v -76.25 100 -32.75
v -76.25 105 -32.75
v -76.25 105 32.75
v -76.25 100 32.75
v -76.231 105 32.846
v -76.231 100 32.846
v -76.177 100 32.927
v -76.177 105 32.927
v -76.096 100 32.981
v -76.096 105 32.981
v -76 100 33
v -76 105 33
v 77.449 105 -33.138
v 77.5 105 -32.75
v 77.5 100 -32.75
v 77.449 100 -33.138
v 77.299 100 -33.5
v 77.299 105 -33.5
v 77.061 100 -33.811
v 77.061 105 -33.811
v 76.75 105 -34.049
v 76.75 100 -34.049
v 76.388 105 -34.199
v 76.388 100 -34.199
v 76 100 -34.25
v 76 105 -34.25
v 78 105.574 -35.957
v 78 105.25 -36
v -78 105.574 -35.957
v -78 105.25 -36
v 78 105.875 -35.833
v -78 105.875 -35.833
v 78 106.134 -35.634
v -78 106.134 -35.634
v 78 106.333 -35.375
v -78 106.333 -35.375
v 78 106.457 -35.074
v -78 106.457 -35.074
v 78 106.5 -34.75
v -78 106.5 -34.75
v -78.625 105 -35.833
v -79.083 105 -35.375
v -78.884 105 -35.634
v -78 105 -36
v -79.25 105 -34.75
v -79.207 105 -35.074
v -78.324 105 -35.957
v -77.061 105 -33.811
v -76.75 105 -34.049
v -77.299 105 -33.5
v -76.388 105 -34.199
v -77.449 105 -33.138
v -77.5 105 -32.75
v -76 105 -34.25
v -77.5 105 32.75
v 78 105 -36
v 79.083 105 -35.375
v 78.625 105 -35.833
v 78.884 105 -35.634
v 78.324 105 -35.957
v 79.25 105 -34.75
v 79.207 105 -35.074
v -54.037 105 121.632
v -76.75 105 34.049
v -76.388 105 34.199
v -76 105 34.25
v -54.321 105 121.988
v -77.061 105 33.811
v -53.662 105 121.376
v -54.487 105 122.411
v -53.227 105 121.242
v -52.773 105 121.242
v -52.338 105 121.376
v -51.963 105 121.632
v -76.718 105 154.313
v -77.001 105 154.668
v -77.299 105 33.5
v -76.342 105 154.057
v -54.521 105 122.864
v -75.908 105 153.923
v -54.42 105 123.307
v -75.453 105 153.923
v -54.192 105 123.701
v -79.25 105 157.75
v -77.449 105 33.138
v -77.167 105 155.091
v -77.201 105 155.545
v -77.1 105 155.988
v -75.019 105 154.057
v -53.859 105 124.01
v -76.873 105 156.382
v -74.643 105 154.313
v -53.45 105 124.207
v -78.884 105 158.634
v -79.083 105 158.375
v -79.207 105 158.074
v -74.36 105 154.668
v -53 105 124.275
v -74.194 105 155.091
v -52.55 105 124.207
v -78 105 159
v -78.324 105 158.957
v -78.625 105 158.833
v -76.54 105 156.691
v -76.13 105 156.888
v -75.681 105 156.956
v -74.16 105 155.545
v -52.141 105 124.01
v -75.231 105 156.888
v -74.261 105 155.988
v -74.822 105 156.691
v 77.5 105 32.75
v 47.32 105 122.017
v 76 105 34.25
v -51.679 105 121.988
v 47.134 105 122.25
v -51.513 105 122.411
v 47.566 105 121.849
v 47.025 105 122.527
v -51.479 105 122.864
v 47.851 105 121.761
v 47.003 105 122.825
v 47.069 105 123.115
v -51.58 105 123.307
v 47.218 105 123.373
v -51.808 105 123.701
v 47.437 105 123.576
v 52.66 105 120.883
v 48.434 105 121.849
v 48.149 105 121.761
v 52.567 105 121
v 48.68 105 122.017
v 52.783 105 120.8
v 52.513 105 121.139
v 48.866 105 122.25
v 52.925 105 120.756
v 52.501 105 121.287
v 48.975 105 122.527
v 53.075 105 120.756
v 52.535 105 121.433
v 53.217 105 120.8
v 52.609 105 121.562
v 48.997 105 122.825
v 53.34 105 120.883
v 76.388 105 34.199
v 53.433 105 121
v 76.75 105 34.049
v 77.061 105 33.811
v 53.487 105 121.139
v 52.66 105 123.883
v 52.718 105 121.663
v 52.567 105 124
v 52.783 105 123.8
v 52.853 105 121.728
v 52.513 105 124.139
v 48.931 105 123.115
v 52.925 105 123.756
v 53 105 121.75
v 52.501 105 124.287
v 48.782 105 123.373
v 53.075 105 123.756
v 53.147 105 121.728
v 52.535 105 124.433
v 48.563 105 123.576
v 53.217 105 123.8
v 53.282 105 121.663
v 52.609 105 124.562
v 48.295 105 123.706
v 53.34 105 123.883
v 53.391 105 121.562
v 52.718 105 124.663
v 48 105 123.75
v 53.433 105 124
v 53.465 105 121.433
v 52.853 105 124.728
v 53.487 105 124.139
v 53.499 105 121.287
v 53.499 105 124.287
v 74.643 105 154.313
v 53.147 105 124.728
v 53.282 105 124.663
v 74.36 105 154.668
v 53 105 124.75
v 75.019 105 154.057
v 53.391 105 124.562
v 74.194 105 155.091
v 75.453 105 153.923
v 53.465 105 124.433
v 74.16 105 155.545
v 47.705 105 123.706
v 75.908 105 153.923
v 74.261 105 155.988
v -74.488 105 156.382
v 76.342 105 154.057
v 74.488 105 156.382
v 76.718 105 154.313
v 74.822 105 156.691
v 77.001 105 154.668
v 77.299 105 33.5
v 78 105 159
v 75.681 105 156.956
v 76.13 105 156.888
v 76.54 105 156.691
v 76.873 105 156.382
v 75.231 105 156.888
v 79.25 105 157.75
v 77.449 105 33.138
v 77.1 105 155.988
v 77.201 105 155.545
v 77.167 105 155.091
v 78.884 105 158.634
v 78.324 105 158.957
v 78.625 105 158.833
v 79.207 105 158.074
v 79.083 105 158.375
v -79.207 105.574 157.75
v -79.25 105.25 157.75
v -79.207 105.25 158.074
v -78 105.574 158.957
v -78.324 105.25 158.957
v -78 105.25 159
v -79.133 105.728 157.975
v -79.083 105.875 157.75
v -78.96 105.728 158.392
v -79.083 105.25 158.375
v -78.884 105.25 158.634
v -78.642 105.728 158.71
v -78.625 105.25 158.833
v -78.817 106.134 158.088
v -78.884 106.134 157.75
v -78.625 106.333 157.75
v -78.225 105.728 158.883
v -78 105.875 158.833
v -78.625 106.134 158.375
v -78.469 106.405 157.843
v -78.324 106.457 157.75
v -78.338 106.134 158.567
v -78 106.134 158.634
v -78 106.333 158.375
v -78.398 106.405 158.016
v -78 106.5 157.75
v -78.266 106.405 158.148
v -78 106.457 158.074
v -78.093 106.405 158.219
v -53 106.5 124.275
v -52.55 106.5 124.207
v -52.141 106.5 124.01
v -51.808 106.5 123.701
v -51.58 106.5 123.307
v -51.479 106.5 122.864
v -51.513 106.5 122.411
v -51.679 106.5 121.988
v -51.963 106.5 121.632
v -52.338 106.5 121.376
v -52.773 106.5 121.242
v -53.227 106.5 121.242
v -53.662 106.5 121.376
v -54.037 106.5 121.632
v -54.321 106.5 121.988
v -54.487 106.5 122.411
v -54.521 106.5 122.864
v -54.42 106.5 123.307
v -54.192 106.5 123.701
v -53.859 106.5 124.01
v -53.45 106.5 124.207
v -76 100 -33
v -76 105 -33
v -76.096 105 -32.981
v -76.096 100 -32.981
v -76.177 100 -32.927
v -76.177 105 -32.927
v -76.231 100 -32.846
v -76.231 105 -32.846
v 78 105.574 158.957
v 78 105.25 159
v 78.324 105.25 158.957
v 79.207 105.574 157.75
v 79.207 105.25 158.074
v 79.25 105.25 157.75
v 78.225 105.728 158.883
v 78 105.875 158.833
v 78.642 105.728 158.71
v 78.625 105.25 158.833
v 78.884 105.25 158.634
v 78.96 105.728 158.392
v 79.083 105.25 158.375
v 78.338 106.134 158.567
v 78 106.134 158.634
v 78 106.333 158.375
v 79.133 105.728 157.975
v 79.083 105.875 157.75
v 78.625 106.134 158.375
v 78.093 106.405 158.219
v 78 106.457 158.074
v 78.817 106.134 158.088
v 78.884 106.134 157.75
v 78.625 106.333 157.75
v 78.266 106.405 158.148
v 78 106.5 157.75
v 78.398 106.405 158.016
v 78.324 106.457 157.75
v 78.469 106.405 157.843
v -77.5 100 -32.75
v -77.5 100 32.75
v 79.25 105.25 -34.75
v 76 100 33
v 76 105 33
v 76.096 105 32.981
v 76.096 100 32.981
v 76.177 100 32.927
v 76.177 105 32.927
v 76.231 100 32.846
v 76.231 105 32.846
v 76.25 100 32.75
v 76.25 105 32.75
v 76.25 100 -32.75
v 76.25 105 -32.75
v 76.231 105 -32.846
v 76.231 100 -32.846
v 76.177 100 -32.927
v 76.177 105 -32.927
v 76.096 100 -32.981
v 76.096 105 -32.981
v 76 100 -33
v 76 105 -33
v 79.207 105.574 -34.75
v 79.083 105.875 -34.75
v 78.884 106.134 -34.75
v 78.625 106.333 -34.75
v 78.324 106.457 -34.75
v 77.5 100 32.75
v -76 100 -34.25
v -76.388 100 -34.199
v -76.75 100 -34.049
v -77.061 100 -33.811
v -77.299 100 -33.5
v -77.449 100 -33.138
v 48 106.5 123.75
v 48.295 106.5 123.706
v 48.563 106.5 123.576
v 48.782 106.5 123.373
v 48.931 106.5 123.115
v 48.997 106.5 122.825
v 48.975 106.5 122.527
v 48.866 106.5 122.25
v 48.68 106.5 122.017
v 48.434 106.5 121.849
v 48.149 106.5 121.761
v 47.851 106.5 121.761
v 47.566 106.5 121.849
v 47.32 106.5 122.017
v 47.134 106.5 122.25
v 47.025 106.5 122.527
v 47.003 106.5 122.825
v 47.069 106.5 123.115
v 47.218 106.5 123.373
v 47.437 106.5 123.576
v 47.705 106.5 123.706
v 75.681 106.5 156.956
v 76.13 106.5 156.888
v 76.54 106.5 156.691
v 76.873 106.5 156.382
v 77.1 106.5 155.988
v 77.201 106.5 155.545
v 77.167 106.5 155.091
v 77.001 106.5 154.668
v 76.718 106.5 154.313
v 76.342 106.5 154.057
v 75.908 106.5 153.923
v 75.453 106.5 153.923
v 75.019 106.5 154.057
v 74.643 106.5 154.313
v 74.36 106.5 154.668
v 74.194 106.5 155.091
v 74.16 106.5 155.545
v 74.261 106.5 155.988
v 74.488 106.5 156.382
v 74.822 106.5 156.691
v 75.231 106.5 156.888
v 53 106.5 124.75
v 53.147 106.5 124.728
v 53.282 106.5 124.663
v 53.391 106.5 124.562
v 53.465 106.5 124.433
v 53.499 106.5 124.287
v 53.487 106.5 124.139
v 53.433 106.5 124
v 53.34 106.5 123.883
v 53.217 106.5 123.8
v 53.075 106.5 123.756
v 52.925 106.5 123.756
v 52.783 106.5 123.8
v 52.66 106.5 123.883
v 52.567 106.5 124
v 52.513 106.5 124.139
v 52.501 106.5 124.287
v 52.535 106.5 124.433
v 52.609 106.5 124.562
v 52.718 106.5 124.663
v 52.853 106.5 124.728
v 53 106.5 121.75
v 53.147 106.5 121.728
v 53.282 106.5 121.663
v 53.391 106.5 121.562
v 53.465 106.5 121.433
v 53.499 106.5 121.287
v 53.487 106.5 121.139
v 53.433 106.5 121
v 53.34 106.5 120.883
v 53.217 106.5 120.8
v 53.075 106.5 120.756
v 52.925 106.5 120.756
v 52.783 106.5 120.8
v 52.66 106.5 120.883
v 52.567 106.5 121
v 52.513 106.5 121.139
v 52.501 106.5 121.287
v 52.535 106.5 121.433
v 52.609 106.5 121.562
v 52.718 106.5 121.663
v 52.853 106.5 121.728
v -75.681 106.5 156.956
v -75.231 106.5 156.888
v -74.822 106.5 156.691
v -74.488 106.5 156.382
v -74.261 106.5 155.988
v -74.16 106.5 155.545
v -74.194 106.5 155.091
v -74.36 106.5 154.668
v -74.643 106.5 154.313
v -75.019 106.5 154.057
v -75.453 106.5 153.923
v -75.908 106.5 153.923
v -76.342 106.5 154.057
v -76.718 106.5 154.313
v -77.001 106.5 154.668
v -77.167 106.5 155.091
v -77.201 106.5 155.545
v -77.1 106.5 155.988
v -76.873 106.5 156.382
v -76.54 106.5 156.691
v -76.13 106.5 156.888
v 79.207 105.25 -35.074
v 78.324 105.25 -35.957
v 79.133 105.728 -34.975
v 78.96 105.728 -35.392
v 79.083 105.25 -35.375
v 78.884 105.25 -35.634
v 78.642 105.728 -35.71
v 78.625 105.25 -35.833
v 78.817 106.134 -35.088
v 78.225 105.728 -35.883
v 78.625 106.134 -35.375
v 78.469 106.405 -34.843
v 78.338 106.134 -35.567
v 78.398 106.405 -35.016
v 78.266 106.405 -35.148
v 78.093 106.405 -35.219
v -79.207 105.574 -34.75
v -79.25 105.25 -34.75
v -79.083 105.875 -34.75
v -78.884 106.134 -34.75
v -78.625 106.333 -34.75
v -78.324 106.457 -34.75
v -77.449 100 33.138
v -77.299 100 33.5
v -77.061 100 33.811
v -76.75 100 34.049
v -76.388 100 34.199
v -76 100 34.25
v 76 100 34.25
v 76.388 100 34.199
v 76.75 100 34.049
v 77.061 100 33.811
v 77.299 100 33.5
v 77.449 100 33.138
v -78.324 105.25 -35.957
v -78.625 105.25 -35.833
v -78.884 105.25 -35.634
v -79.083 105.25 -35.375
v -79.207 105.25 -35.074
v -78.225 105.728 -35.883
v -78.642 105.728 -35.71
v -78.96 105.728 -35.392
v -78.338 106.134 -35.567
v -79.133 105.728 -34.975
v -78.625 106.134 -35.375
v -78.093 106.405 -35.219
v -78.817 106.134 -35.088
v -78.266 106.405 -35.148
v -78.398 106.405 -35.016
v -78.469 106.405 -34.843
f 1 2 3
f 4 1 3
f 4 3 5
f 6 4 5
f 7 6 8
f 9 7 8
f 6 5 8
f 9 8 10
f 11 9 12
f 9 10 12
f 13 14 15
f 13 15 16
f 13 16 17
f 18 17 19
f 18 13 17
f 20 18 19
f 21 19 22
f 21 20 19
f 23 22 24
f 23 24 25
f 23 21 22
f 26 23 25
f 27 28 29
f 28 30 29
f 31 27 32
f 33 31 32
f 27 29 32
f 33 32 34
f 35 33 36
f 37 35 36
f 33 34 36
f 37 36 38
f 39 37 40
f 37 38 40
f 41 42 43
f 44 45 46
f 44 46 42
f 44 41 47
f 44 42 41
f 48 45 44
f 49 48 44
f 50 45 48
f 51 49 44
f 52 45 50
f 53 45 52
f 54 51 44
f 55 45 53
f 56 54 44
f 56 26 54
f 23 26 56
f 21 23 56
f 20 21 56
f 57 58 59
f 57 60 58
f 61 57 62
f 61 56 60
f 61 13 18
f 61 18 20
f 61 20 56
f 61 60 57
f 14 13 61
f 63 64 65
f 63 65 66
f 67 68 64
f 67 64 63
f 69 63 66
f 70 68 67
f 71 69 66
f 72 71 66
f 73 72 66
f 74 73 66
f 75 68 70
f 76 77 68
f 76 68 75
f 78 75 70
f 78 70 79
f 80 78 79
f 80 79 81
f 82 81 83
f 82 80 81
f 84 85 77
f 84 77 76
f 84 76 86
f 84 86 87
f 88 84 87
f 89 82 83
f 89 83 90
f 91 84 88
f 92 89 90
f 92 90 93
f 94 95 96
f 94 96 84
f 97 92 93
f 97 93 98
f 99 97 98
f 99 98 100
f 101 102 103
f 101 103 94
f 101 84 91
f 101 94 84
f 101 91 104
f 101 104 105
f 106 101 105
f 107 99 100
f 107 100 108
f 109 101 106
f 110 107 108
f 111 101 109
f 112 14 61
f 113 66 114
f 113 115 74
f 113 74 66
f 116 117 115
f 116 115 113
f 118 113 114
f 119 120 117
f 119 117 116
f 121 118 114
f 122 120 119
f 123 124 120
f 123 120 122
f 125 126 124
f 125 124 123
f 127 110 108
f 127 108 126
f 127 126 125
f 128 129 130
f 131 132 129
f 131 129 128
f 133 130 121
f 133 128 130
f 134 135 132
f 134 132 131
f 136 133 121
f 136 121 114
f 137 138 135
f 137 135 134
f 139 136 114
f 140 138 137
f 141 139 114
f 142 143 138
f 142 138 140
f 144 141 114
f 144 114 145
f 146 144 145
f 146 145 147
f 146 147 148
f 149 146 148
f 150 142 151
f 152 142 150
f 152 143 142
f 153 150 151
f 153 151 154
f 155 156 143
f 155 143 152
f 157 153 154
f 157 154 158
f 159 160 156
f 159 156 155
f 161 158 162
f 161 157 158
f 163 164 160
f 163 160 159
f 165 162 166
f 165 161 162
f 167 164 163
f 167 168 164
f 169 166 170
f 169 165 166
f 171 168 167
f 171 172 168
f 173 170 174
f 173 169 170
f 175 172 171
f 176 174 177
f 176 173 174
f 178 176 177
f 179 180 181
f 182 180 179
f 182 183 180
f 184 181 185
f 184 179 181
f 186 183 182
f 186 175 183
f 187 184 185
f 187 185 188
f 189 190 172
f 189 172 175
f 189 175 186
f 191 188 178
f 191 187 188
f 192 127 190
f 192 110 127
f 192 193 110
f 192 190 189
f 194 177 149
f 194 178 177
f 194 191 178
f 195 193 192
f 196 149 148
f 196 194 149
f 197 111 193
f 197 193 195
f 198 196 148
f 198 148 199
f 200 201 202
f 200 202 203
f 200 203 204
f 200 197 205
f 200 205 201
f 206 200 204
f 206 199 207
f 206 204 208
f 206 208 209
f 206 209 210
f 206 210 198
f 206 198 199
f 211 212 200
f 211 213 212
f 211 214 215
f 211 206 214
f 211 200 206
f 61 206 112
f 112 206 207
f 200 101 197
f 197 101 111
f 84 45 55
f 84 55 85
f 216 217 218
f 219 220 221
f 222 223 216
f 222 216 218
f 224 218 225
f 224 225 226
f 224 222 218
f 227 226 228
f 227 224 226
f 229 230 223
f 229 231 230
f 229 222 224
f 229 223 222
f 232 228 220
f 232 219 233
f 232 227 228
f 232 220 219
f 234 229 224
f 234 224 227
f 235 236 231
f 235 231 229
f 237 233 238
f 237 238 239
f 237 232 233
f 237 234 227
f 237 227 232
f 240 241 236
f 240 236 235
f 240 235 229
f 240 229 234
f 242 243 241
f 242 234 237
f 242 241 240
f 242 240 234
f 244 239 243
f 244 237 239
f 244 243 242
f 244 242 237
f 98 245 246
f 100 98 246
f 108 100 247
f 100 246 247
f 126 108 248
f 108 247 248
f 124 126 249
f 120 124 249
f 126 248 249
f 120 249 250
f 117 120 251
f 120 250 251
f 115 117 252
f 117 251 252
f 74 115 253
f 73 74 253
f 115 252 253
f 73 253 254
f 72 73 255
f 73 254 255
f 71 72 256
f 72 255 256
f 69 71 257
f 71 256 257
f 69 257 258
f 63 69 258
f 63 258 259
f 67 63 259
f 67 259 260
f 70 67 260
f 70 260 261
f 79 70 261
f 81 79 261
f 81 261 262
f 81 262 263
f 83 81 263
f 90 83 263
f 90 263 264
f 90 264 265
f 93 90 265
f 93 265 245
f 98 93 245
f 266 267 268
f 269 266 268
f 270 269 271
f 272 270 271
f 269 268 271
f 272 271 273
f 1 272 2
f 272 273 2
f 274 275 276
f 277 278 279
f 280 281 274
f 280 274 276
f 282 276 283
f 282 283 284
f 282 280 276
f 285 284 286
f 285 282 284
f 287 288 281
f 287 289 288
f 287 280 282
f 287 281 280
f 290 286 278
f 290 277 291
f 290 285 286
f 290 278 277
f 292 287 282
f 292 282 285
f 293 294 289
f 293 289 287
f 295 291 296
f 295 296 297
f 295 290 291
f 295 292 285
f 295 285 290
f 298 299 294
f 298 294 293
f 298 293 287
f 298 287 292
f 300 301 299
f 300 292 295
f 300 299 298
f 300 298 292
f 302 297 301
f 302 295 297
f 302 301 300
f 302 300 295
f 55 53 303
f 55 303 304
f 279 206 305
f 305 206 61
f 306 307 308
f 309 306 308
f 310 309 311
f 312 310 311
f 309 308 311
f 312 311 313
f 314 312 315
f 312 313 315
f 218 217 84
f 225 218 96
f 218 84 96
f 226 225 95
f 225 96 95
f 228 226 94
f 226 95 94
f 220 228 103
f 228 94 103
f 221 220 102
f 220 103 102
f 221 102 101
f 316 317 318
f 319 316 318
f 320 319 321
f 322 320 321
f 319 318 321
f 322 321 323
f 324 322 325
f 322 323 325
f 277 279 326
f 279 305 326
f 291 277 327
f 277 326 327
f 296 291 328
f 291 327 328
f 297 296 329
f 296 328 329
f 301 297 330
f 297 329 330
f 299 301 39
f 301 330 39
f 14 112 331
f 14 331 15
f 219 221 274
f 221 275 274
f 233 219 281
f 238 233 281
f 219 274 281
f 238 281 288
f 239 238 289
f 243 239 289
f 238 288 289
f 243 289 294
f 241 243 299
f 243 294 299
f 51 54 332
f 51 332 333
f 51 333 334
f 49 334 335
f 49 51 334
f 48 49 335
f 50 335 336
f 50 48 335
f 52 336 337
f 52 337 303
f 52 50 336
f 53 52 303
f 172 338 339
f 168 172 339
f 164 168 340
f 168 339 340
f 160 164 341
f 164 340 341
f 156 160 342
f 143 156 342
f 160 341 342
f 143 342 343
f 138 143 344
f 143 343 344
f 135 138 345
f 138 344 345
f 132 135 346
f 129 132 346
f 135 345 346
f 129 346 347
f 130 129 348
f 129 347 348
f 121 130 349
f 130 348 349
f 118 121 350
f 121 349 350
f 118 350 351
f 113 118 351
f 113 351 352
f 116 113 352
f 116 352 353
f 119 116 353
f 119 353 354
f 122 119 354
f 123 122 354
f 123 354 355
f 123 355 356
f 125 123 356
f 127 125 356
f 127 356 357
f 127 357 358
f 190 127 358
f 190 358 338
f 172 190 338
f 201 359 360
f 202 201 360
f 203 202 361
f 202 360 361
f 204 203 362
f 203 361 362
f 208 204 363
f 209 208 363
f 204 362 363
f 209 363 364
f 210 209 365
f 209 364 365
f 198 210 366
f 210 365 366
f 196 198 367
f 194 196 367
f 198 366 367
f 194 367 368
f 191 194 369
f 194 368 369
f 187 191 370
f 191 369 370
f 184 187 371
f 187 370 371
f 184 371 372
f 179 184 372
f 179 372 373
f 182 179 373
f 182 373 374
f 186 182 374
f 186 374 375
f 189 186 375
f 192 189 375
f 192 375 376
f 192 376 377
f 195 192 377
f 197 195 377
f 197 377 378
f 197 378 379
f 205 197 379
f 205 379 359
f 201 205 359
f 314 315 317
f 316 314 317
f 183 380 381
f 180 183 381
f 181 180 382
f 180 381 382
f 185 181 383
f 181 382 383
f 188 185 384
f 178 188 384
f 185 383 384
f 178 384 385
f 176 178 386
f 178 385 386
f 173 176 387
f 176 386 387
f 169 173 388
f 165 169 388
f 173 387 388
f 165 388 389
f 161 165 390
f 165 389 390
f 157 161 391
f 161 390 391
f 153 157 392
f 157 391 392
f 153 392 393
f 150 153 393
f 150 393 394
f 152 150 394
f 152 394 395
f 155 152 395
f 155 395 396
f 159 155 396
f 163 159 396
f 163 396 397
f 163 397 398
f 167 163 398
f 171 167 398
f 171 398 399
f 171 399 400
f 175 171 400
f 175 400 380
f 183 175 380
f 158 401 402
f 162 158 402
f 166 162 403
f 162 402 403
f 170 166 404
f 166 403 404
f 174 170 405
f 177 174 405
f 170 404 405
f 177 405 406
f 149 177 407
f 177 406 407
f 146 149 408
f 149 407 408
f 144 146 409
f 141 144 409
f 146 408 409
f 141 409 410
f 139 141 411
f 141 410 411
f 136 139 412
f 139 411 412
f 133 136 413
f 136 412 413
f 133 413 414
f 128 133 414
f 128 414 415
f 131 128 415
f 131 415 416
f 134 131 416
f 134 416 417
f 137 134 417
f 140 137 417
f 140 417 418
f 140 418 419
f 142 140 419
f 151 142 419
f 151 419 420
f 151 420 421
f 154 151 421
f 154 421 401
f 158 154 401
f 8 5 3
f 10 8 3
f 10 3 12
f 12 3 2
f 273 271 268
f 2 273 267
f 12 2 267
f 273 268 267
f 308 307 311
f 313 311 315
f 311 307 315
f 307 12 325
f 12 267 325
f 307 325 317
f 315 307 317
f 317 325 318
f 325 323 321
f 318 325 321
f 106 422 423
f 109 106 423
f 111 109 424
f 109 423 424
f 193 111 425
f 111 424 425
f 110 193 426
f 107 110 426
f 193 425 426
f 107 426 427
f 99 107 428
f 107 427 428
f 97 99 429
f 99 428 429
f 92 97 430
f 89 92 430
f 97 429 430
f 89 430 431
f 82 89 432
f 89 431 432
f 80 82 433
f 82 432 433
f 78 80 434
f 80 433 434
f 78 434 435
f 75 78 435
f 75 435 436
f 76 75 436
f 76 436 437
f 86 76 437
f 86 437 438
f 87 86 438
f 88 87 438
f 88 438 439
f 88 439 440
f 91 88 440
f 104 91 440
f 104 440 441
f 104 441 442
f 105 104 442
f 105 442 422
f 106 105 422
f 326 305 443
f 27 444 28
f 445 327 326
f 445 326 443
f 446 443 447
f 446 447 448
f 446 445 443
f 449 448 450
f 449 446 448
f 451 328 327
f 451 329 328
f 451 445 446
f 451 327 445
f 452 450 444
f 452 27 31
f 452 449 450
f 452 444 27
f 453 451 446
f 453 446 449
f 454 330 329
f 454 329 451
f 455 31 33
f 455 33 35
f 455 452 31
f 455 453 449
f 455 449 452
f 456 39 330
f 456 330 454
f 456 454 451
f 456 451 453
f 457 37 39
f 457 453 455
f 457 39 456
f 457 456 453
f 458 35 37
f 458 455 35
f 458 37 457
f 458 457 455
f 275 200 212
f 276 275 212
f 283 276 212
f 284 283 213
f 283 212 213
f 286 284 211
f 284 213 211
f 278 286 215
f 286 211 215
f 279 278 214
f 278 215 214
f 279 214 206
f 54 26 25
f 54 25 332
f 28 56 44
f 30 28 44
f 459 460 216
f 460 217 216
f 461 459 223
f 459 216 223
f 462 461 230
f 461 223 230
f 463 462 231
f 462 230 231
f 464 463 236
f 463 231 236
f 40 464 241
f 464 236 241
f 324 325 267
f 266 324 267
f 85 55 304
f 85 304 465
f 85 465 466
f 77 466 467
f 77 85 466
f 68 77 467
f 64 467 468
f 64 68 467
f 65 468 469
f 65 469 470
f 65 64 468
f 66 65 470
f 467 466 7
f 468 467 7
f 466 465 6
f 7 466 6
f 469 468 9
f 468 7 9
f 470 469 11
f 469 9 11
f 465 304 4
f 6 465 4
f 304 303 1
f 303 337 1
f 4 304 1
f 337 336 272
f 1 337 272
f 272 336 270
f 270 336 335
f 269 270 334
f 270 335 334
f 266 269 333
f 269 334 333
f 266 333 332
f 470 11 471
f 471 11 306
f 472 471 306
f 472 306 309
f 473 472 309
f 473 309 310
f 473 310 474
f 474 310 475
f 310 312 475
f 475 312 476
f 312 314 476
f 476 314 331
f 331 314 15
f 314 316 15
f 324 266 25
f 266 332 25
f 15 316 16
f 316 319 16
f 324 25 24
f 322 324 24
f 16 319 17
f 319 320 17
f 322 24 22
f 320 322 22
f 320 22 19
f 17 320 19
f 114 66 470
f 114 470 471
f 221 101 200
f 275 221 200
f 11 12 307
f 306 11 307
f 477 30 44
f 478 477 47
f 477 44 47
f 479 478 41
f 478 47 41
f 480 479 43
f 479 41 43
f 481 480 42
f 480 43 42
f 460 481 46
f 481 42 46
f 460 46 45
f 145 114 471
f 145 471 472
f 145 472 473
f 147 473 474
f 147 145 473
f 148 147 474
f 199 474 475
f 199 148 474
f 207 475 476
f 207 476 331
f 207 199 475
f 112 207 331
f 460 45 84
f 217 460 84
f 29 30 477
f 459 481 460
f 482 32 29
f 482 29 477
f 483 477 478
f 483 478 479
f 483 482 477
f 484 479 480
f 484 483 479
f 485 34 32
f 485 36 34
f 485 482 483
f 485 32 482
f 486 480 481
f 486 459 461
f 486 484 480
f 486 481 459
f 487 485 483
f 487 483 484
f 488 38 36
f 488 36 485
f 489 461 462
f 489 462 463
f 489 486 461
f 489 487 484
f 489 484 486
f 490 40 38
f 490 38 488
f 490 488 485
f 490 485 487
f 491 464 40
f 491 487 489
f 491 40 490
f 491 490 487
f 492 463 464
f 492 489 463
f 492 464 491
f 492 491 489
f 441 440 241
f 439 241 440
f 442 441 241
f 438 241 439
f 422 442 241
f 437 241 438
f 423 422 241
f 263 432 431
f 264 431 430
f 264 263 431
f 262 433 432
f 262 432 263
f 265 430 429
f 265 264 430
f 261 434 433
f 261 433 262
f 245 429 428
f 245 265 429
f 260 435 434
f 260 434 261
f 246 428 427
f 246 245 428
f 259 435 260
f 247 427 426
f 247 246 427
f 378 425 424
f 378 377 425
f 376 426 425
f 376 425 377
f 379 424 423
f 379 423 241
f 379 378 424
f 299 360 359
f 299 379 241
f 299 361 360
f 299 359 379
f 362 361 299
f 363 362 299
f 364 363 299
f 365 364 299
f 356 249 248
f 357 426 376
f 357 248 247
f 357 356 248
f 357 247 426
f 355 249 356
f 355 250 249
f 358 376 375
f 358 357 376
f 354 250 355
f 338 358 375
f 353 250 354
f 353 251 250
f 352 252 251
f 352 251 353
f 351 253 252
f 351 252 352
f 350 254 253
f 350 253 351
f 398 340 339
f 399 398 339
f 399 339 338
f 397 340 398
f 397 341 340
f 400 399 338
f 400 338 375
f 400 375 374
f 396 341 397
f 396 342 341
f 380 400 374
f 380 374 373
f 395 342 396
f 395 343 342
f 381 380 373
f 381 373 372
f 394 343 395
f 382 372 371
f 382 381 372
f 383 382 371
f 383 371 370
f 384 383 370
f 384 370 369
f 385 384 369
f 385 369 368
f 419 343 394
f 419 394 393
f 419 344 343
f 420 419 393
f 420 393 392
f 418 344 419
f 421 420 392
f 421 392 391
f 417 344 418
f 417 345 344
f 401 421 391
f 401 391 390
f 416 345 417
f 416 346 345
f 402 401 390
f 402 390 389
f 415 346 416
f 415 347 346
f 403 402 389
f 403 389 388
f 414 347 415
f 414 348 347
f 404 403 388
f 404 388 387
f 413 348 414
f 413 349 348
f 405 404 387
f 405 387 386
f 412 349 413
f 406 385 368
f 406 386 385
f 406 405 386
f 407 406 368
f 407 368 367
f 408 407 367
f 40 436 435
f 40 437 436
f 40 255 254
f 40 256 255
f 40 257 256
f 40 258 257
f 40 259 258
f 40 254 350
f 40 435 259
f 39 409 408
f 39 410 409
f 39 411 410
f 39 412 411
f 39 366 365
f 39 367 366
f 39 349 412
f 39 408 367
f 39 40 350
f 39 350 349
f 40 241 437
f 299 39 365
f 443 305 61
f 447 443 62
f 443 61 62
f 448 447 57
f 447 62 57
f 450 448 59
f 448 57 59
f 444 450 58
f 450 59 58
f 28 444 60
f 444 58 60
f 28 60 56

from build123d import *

# Parameters (mm, degrees)
BOSS_EXTRUDE1_DEPTH      = 1.25
SKETCH1_W                = 156
SKETCH1_H                = 69.5
BOSS_EXTRUDE2_DEPTH      = 105
SKETCH4_R                = 2.5000000000000027
BOSS_EXTRUDE3_DEPTH      = 8
FILLET2_R                = 2
SKETCH5_R                = 1.5499999999999998
SKETCH5_R_2              = 1.5500000000000012
CUT_EXTRUDE1_DEPTH       = 8
SKETCH6_R                = 8.25
CUT_EXTRUDE2_DEPTH       = 8
SKETCH8_R                = 3.750000000000007
SKETCH8_R_2              = 3.0000000000000084
SKETCH8_W                = 7.000000000000014
SKETCH8_H                = 14
CUT_EXTRUDE3_DEPTH       = 8
FILLET3_R                = 1.25
FILLET4_R                = 1.25
SKETCH11_R               = 1.5499999999999932
CUT_EXTRUDE4_DEPTH       = 8
BOSS_EXTRUDE5_REACH      = 209.004
FILLET5_R                = 1.25
SKETCH14_R               = 1.5249999999999995
CUT_EXTRUDE5_DEPTH       = 8
BOSS_EXTRUDE6_DEPTH      = 5
CUT_EXTRUDE10_DEPTH      = 176.50000000000017
CUT_EXTRUDE10_DEPTH_BACK = 9
SKETCH19_R               = 1.5249999999999995
BOSS_EXTRUDE7_DEPTH      = 1.5
SKETCH17_W               = 214.39373035957487
SKETCH17_H               = 311.75060194691184
CUT_EXTRUDE6_DEPTH       = 142.50000000000003
SKETCH18_W               = 843.8612520819788
SKETCH18_H               = 210.19069540658822
CUT_EXTRUDE7_DEPTH       = 211.50000000000009
FILLET6_R                = 1.25
SKETCH21_R               = 1.5249999999999995
CUT_EXTRUDE11_DEPTH      = 46.50000000000004
SKETCH22_R               = 1.5249999999999952
SKETCH22_R_2             = 0.49999999999999917
SKETCH22_R_3             = 0.9999999999999983
CUT_EXTRUDE12_DEPTH      = 46.50000000000004


with BuildPart() as part:
    # Sketch2 → Boss-Extrude1 (new body)
    with BuildSketch(Plane(origin=(0, 0, 0), x_dir=(1, 0, 0), z_dir=(0, 1, 0))):
        Polygon((-79.25000000000004, 35.99999999999998), (79.24999999999996, 35.99999999999999), (79.24999999999999, -159.00000000000003), (-79.25000000000001, -159.00000000000003), align=None)
    extrude(amount=-BOSS_EXTRUDE1_DEPTH)

    # Sketch1 → Boss-Extrude2 (add)
    with BuildSketch(Plane(origin=(0, 0, 0), x_dir=(1, 0, 0), z_dir=(0, 1, 0))):
        Polygon((79.24999999999999, -159.00000000000003), (-79.25000000000001, -159.00000000000003), (-79.25000000000004, -86.00000000000001), (-79.25000000000004, -36.00000000000002), (-79.25000000000004, 35.99999999999998), (79.24999999999996, 35.99999999999999), (79.24999999999996, -36.00000000000002), (79.24999999999996, -86.00000000000001), align=None)
        Polygon((-78.00000000000001, -157.75000000000006), (77.99999999999999, -157.75000000000006), (77.99999999999996, -86.00000000000001), (77.99999999999996, -36.00000000000002), (-78.00000000000004, -36.00000000000002), (-78.00000000000004, -86.00000000000001), (-78.00000000000004, -100.58859756900745), align=None, mode=Mode.SUBTRACT)
        Rectangle(SKETCH1_W, SKETCH1_H, mode=Mode.SUBTRACT)
    extrude(amount=BOSS_EXTRUDE2_DEPTH)

    # Sketch4 → Boss-Extrude3 (add)
    with BuildSketch(Plane(origin=(0, 0, 0), x_dir=(1, 0, 0), z_dir=(0, 1, 0))):
        with Locations(Location((-37.074999999999996, -117.75000000000004, 0), (0, 0, 90))):
            Circle(SKETCH4_R)
        with Locations(Location((37.074999999999996, -117.75000000000003, 0), (0, 0, 90))):
            Circle(SKETCH4_R)
    extrude(amount=BOSS_EXTRUDE3_DEPTH)

    # Fillet2
    fillet2_edges = [part.edges().sort_by_distance(p)[0] for p in [
        (77.99999999999996, 52.5, -34.749999999999986),
        (77.99999999999996, 52.5, 34.750000000000014),
        (-78.00000000000004, 0, 1.421e-14),
        (-78.00000000000004, 52.5, 34.750000000000014),
        (77.99999999999999, 52.5, 157.75000000000006),
        (-78.00000000000001, 52.5, 157.75000000000006),
        (-4.263e-14, 0, 36.00000000000002),
        (-78.00000000000004, 52.5, 36.00000000000002),
        (77.99999999999997, 0, 96.87500000000003),
        (77.99999999999996, 52.5, 36.00000000000002),
        (-4.263e-14, 0, -34.749999999999986),
        (-78.00000000000004, 52.5, -34.749999999999986),
        (-1.421e-14, 0, 157.75000000000006),
        (-78.00000000000003, 0, 96.87500000000004),
        (77.99999999999996, 0, 1.421e-14),
        (-4.263e-14, 0, 34.750000000000014),
        (-37.074999999999996, 0, 120.25000000000004),
        (37.074999999999996, 0, 120.25000000000003),
    ]]
    fillet(fillet2_edges, radius=FILLET2_R)

    # Sketch5 → Cut-Extrude1 (cut)
    with BuildSketch(Plane.XY.offset(36.00000000000002)):
        with BuildLine():
            ThreePointArc((-53.750000000000085, 99.54999999999998), (-54.84601551083924, 99.09601551083914), (-55.30000000000008, 97.99999999999999))
            Line((-55.30000000000008, 97.99999999999999), (-53.750000000000085, 97.99999999999999))
            Line((-53.750000000000085, 97.99999999999999), (-53.750000000000085, 99.54999999999998))
        make_face()
        with BuildLine():
            Line((-53.750000000000085, 97.99999999999999), (-55.30000000000008, 97.99999999999999))
            ThreePointArc((-55.30000000000008, 97.99999999999999), (-53.750000000000085, 96.44999999999999), (-52.20000000000009, 97.99999999999999))
            ThreePointArc((-52.20000000000009, 97.99999999999999), (-52.65398448916093, 99.09601551083914), (-53.750000000000085, 99.54999999999998))
            Line((-53.750000000000085, 99.54999999999998), (-53.750000000000085, 97.99999999999999))
        make_face()
        with Locations((53.750000000000206, 97.99999999999967)):
            Circle(SKETCH5_R)
        with Locations((-53.750000000000085, 7.999999999999743)):
            Circle(SKETCH5_R_2)
        with Locations((53.749999999999666, 7.9999999999994245)):
            Circle(SKETCH5_R_2)
    extrude(amount=-CUT_EXTRUDE1_DEPTH, mode=Mode.SUBTRACT)

    # Sketch6 → Cut-Extrude2 (cut)
    with BuildSketch(Plane(origin=(0, 0, 157.75000000000006), x_dir=(-1, 0, 0), z_dir=(0, 0, -1))):
        with Locations((0, 22)):
            Circle(SKETCH6_R)
    extrude(amount=-CUT_EXTRUDE2_DEPTH, mode=Mode.SUBTRACT)

    # Sketch8 → Cut-Extrude3 (cut)
    with BuildSketch(Plane.ZY.offset(79.25000000000004)):
        with Locations((131.5, 54.99999999999998)):
            Circle(SKETCH8_R)
        with Locations((101.50000000000001, 54.99999999999998)):
            Circle(SKETCH8_R_2)
        with Locations((116.50000000000003, 64.99999999999999)):
            Rectangle(SKETCH8_W, SKETCH8_H)
        with Locations((101.50000000000001, 64.99999999999997)):
            Circle(SKETCH8_R_2)
        with Locations((101.50000000000001, 74.99999999999997)):
            Circle(SKETCH8_R_2)
        with Locations((101.50000000000001, 84.99999999999997)):
            Circle(SKETCH8_R_2)
        with Locations((131.5, 74.99999999999999)):
            Circle(SKETCH8_R)
    extrude(amount=-CUT_EXTRUDE3_DEPTH, mode=Mode.SUBTRACT)

    # Fillet3
    fillet3_edges = [part.edges().sort_by_distance(p)[0] for p in [
        (79.24999999999997, -1.25, 61.50000000000002),
        (-4.263e-14, -1.25, -35.999999999999986),
        (-79.25000000000003, -1.25, 61.50000000000003),
        (-1.421e-14, -1.25, 159.00000000000003),
    ]]
    fillet(fillet3_edges, radius=FILLET3_R)

    # Fillet4
    # the kernel refuses this fillet: 1.25 mm, written as the material it takes off along each edge
    with BuildSketch(Plane(origin=(-78.00000000000004, 0, -34.74999999999997), x_dir=(-9e-17, 0, -1), z_dir=(-1, 0, 1.5e-16))) as fillet4_piece_1_section:
        Polygon((0, 0), (FILLET4_R, 0), (FILLET4_R, FILLET4_R), (0, FILLET4_R), align=None)
    fillet4_piece_1 = extrude(amount=FILLET4_R, mode=Mode.PRIVATE)
    fillet4_piece_1 = fillet4_piece_1 - Plane(origin=(-78.00000000000004, 0, -34.74999999999997), x_dir=(0, 0.7071067811865475, 0.7071067811865475), z_dir=(-1, 0, 1.5e-16)) * Sphere(FILLET4_R, mode=Mode.PRIVATE)
    add(fillet4_piece_1, mode=Mode.SUBTRACT)
    with BuildSketch(Plane(origin=(77.99999999999996, 0, -34.74999999999999), x_dir=(-9e-17, 0, -1), z_dir=(1, 0, -1.5e-16))) as fillet4_piece_2_section:
        Polygon((0, 0), (FILLET4_R, 0), (FILLET4_R, -FILLET4_R), (0, -FILLET4_R), align=None)
    fillet4_piece_2 = extrude(amount=FILLET4_R, mode=Mode.PRIVATE)
    fillet4_piece_2 = fillet4_piece_2 - Plane(origin=(77.99999999999996, 0, -34.74999999999999), x_dir=(0, 0.7071067811865475, 0.7071067811865475), z_dir=(1, 0, -1.5e-16)) * Sphere(FILLET4_R, mode=Mode.PRIVATE)
    add(fillet4_piece_2, mode=Mode.SUBTRACT)
    with BuildSketch(Plane(origin=(-78.00000000000001, 0, 157.75000000000003), x_dir=(-1, 0, 1.5e-16), z_dir=(0, 0, 1))) as fillet4_piece_3_section:
        Polygon((0, 0), (FILLET4_R, 0), (FILLET4_R, FILLET4_R), (0, FILLET4_R), align=None)
    fillet4_piece_3 = extrude(amount=FILLET4_R, mode=Mode.PRIVATE)
    fillet4_piece_3 = fillet4_piece_3 - Plane(origin=(-78.00000000000001, 0, 157.75000000000003), x_dir=(0.7071067811865475, 0.7071067811865475, 0), z_dir=(0, 0, 1)) * Sphere(FILLET4_R, mode=Mode.PRIVATE)
    add(fillet4_piece_3, mode=Mode.SUBTRACT)
    with BuildSketch(Plane(origin=(77.99999999999999, 0, 157.75000000000003), x_dir=(1, 0, -1.5e-16), z_dir=(0, 0, 1))) as fillet4_piece_4_section:
        Polygon((0, 0), (FILLET4_R, 0), (FILLET4_R, -FILLET4_R), (0, -FILLET4_R), align=None)
    fillet4_piece_4 = extrude(amount=FILLET4_R, mode=Mode.PRIVATE)
    fillet4_piece_4 = fillet4_piece_4 - Plane(origin=(77.99999999999999, 0, 157.75000000000003), x_dir=(-0.7071067811865475, 0.7071067811865475, 0), z_dir=(0, 0, 1)) * Sphere(FILLET4_R, mode=Mode.PRIVATE)
    add(fillet4_piece_4, mode=Mode.SUBTRACT)
    with BuildSketch(Plane(origin=(79.24999999999999, 108.12500000000007, 159.00000000000003), x_dir=(-1, 0, 0), z_dir=(0, -1, 0))) as fillet4_piece_5:
        with BuildLine():
            CenterArc((FILLET4_R, FILLET4_R), FILLET4_R, 179.9999999999987, 90.00000000000131)
            Line((0, FILLET4_R), (0, 0))
            Line((0, 0), (FILLET4_R, 0))
        make_face()
    extrude(amount=108.12500000000007, mode=Mode.SUBTRACT)
    with BuildSketch(Plane(origin=(-79.25000000000001, -2.2e-16, 159.00000000000003), x_dir=(1, 0, 0), z_dir=(0, 1, 0))) as fillet4_piece_6:
        with BuildLine():
            CenterArc((FILLET4_R, FILLET4_R), FILLET4_R, 180, 90)
            Line((0, FILLET4_R), (0, 0))
            Line((0, 0), (FILLET4_R, 0))
        make_face()
    extrude(amount=108.12499999999999, mode=Mode.SUBTRACT)
    with BuildSketch(Plane(origin=(79.24999999999996, 108.125, -35.99999999999999), x_dir=(0, 0, 1), z_dir=(0, -1, 0))) as fillet4_piece_7:
        with BuildLine():
            CenterArc((FILLET4_R, FILLET4_R), FILLET4_R, 180, 90)
            Line((0, FILLET4_R), (0, 0))
            Line((0, 0), (FILLET4_R, 0))
        make_face()
    extrude(amount=108.125, mode=Mode.SUBTRACT)
    with BuildSketch(Plane(origin=(-79.25000000000004, -2.2e-16, -35.99999999999998), x_dir=(0, 0, 1), z_dir=(0, 1, 0))) as fillet4_piece_8:
        with BuildLine():
            CenterArc((FILLET4_R, FILLET4_R), FILLET4_R, 180, 90)
            Line((-2.132e-14, FILLET4_R), (0, 0))
            Line((0, 0), (FILLET4_R, 0))
        make_face()
    extrude(amount=108.12499999999999, mode=Mode.SUBTRACT)

    # Sketch11 → Cut-Extrude4 (cut)
    with BuildSketch(Plane(origin=(79.24999999999996, 0, -1.128e-14), x_dir=(-1.4e-16, 0, -1), z_dir=(1, 0, -1.4e-16))):
        with BuildLine():
            ThreePointArc((-13.05000000000001, 102.49999999999999), (-12.596015510839159, 101.40398448916083), (-11.50000000000001, 100.94999999999999))
            Line((-11.50000000000001, 100.94999999999999), (-11.50000000000001, 102.49999999999999))
            Line((-11.500000000000014, 102.49999999999999), (-13.050000000000011, 102.49999999999999))
        make_face()
        with BuildLine():
            Line((-11.50000000000001, 102.49999999999999), (-11.50000000000001, 100.94999999999999))
            ThreePointArc((-11.50000000000001, 100.94999999999999), (-10.403984489160864, 101.40398448916083), (-9.950000000000012, 102.49999999999999))
            ThreePointArc((-9.950000000000012, 102.49999999999999), (-11.50000000000001, 104.04999999999998), (-13.05000000000001, 102.49999999999999))
            Line((-13.050000000000011, 102.49999999999999), (-11.500000000000014, 102.49999999999999))
        make_face()
        with BuildLine():
            ThreePointArc((-25.550000000000008, 90), (-25.096015510839155, 88.90398448916085), (-24.000000000000007, 88.45))
            Line((-24.000000000000007, 88.45000000000002), (-24.000000000000007, 90))
            Line((-24, 90), (-25.55000000000001, 90))
        make_face()
        with BuildLine():
            Line((-24.000000000000007, 90), (-24.000000000000007, 88.45000000000002))
            ThreePointArc((-24.000000000000007, 88.45), (-22.90398448916086, 88.90398448916085), (-22.450000000000006, 90))
            ThreePointArc((-22.450000000000006, 90), (-24.000000000000007, 91.55), (-25.550000000000008, 90))
            Line((-25.55000000000001, 90), (-24, 90))
        make_face()
        with BuildLine():
            ThreePointArc((-9.949999999999998, 2.4999999999999742), (-10.403984489160848, 3.5960155108391216), (-11.499999999999995, 4.049999999999974))
            Line((-11.499999999999996, 4.049999999999969), (-11.499999999999996, 2.4999999999999716))
            Line((-11.5, 2.4999999999999742), (-13.049999999999997, 2.4999999999999742))
            ThreePointArc((-13.049999999999995, 2.4999999999999742), (-11.499999999999996, 0.9499999999999749), (-9.949999999999998, 2.499999999999974))
        make_face()
        with BuildLine():
            Line((-11.499999999999996, 2.4999999999999716), (-11.499999999999996, 4.049999999999969))
            ThreePointArc((-11.499999999999995, 4.049999999999974), (-12.596015510839145, 3.596015510839123), (-13.049999999999995, 2.4999999999999742))
            Line((-13.049999999999997, 2.4999999999999742), (-11.5, 2.4999999999999742))
        make_face()
        with BuildLine():
            ThreePointArc((-111.5, 4.049999999999969), (-112.59601551083915, 1.40398448916083), (-109.95, 2.499999999999974))
            Line((-109.95, 2.4999999999999742), (-111.5, 2.4999999999999742))
            Line((-111.5, 2.4999999999999716), (-111.5, 4.049999999999969))
        make_face()
        with BuildLine():
            Line((-111.5, 2.4999999999999742), (-109.95, 2.4999999999999742))
            ThreePointArc((-109.95, 2.4999999999999742), (-110.40398448916086, 3.5960155108391185), (-111.5, 4.049999999999969))
            Line((-111.5, 4.049999999999969), (-111.5, 2.4999999999999716))
        make_face()
        with BuildLine():
            ThreePointArc((-97.45, 14.999999999999993), (-97.90398448916086, 16.096015510839138), (-99, 16.549999999999986))
            Line((-99, 16.549999999999986), (-99, 14.999999999999993))
            Line((-99, 14.999999999999993), (-97.45, 14.999999999999993))
        make_face()
        with BuildLine():
            Line((-99, 14.999999999999993), (-99, 16.549999999999986))
            ThreePointArc((-99, 16.549999999999986), (-100.09601551083915, 13.903984489160848), (-97.45, 14.999999999999993))
            Line((-97.45, 14.999999999999993), (-99, 14.999999999999993))
        make_face()
        with BuildLine():
            ThreePointArc((-22.450000000000006, 14.999999999999993), (-22.90398448916086, 16.09601551083914), (-24.000000000000007, 16.549999999999994))
            Line((-24.000000000000007, 16.549999999999994), (-24.000000000000007, 14.999999999999993))
            Line((-24, 14.999999999999993), (-25.55000000000001, 14.999999999999993))
            ThreePointArc((-25.550000000000008, 14.999999999999993), (-24.000000000000007, 13.449999999999992), (-22.450000000000006, 14.999999999999993))
        make_face()
        with BuildLine():
            Line((-24.000000000000007, 14.999999999999993), (-24.000000000000007, 16.549999999999994))
            ThreePointArc((-24.000000000000007, 16.549999999999994), (-25.096015510839155, 16.09601551083914), (-25.550000000000008, 14.999999999999993))
            Line((-25.55000000000001, 14.999999999999993), (-24, 14.999999999999993))
        make_face()
        with Locations((-111.50000000000001, 102.49999999999999)):
            Circle(SKETCH11_R)
        with Locations((-99, 90)):
            Circle(SKETCH11_R)
    extrude(amount=-CUT_EXTRUDE4_DEPTH, mode=Mode.SUBTRACT)

    # Boss-Extrude5: up to this face of the body (flat: up to its plane)
    boss_extrude5_end = Plane(part.part.faces().sort_by_distance((0, 0, 96.725539908))[0])
    # Sketch12 → Boss-Extrude5 (add, up to the picked face)
    with BuildSketch(Plane(origin=(0, 105, 0), x_dir=(1, 0, 0), z_dir=(0, 1, 0)), mode=Mode.PRIVATE) as boss_extrude5_sk1:
        with BuildLine():
            Line((73, -152.75000000000043), (72.99999999999997, -157.75000000000043))
            Line((72.99999999999997, -157.75000000000043), (75.99999999999996, -157.75000000000045))
            ThreePointArc((75.99999999999996, -157.75000000000006), (77.41421356237305, -157.16421356237316), (77.99999999999994, -155.75000000000006))
            Line((77.99999999999999, -155.75000000000006), (78, -152.75000000000045))
            Line((78, -152.75000000000045), (73, -152.75000000000043))
        make_face()
    boss_extrude5_tool1 = split(extrude(boss_extrude5_sk1.sketch, amount=-BOSS_EXTRUDE5_REACH, mode=Mode.PRIVATE), bisect_by=boss_extrude5_end, keep=Keep.BOTH, mode=Mode.PRIVATE)
    # Sketch12 → Boss-Extrude5 (add, up to the picked face)
    with BuildSketch(Plane(origin=(0, 105, 0), x_dir=(1, 0, 0), z_dir=(0, 1, 0)), mode=Mode.PRIVATE) as boss_extrude5_sk2:
        with BuildLine():
            ThreePointArc((-78.00000000000003, -155.75000000000006), (-77.41421356237313, -157.16421356237316), (-76.00000000000003, -157.75000000000006))
            Line((-76.00000000000003, -157.75000000000006), (-73.00000000000003, -157.75000000000006))
            Line((-73.00000000000003, -157.75000000000006), (-73.00000000000003, -152.75000000000006))
            Line((-73.00000000000003, -152.75000000000006), (-78.00000000000003, -152.75000000000006))
            Line((-78.00000000000003, -152.75000000000006), (-78.00000000000003, -155.75000000000006))
        make_face()
    boss_extrude5_tool2 = split(extrude(boss_extrude5_sk2.sketch, amount=-BOSS_EXTRUDE5_REACH, mode=Mode.PRIVATE), bisect_by=boss_extrude5_end, keep=Keep.BOTH, mode=Mode.PRIVATE)
    add(boss_extrude5_tool1.solids().sort_by(Axis((75.426992, 105, 155.176992), (0, -1, 0)))[0])
    add(boss_extrude5_tool2.solids().sort_by(Axis((-75.426992, 105, 155.176992), (0, -1, 0)))[0])

    # Fillet5
    fillet5_edges = [part.edges().sort_by_distance(p)[0] for p in [
        (77.41421356237306, 0.5857864376269042, 152.75000000000043),
        (72.99999999999999, 0.5857864376269046, 157.16421356237316),
        (72.99999999999997, 53.5, 157.75000000000043),
        (74.49999999999999, 0, 152.75000000000043),
        (73, 52.5, 152.75000000000043),
        (78, 53.5, 152.75000000000045),
        (73, 0, 154.25000000000023),
        (-77.41421356237313, 0.5857864376269042, 152.75000000000006),
        (-73.00000000000003, 0, 154.25000000000006),
        (-73.00000000000003, 52.5, 152.75000000000006),
        (-78.00000000000003, 53.5, 152.75000000000006),
        (-74.50000000000003, 0, 152.75000000000006),
        (-73.00000000000003, 0.5857864376269046, 157.16421356237316),
        (-73.00000000000003, 53.5, 157.75000000000006),
    ]]
    fillet(fillet5_edges, radius=FILLET5_R)

    # Sketch14 → Cut-Extrude5 (cut)
    with BuildSketch(Plane(origin=(0, 105, 0), x_dir=(1, 0, 0), z_dir=(0, 1, 0))):
        with Locations(Location((75.68305826175839, -155.43305826175865, 0), (0, 0, 270))):
            Circle(SKETCH14_R)
        with Locations(Location((-75.68305826175845, -155.43305826175828, 0), (0, 0, 270))):
            Circle(SKETCH14_R)
    extrude(amount=-CUT_EXTRUDE5_DEPTH, mode=Mode.SUBTRACT)

    # Sketch19 → Cut-Extrude10 (cut, two sides: drawn at the far end of the back side and taken through both)
    with BuildSketch(Plane(origin=(0, 105, 0), x_dir=(1, 0, 0), z_dir=(0, 1, 0)).offset(-CUT_EXTRUDE10_DEPTH_BACK)):
        with Locations(Location((75.68305826175839, -155.43305826175865, 0), (0, 0, 270))):
            Circle(SKETCH19_R)
        with Locations(Location((-75.68305826175845, -155.43305826175828, 0), (0, 0, 270))):
            Circle(SKETCH19_R)
    extrude(amount=CUT_EXTRUDE10_DEPTH + CUT_EXTRUDE10_DEPTH_BACK, mode=Mode.SUBTRACT)



with BuildPart() as body_2:
    # Sketch15 → Boss-Extrude6 (new body)
    with BuildSketch(Plane(origin=(0, 105, 0), x_dir=(1, 0, 0), z_dir=(0, 1, 0))):
        with BuildLine():
            Line((-77.50000000000004, 32.749999999999986), (-77.50000000000004, -32.750000000000014))
            ThreePointArc((-77.50000000000004, -32.750000000000014), (-77.06066017177986, -33.81066017177984), (-76.00000000000004, -34.250000000000014))
            Line((-76.00000000000004, -34.250000000000014), (75.99999999999996, -34.250000000000014))
            ThreePointArc((75.99999999999996, -34.250000000000014), (77.06066017177977, -33.81066017177984), (77.49999999999996, -32.750000000000014))
            Line((77.49999999999996, -32.750000000000014), (77.49999999999996, 32.749999999999986))
            ThreePointArc((77.49999999999996, 32.749999999999986), (77.06066017177977, 33.81066017177981), (75.99999999999996, 34.249999999999986))
            Line((75.99999999999996, 34.249999999999986), (-76.00000000000004, 34.249999999999986))
            ThreePointArc((-76.00000000000004, 34.249999999999986), (-77.06066017177986, 33.81066017177981), (-77.50000000000004, 32.749999999999986))
        make_face()
        with BuildLine():
            Line((75.99999999999996, 32.999999999999986), (-76.00000000000004, 32.999999999999986))
            ThreePointArc((-76.00000000000004, 32.999999999999986), (-76.17677669529668, 32.926776695296624), (-76.25000000000004, 32.749999999999986))
            Line((-76.25000000000004, 32.749999999999986), (-76.25000000000004, -32.750000000000014))
            ThreePointArc((-76.25000000000004, -32.750000000000014), (-76.17677669529668, -32.92677669529665), (-76.00000000000004, -33.000000000000014))
            Line((-76.00000000000004, -33.000000000000014), (75.99999999999996, -33.000000000000014))
            ThreePointArc((75.99999999999996, -33.000000000000014), (76.1767766952966, -32.92677669529665), (76.24999999999996, -32.750000000000014))
            Line((76.24999999999996, -32.750000000000014), (76.24999999999996, 32.749999999999986))
            ThreePointArc((76.24999999999996, 32.749999999999986), (76.1767766952966, 32.926776695296624), (75.99999999999996, 32.999999999999986))
        make_face(mode=Mode.SUBTRACT)
    extrude(amount=-BOSS_EXTRUDE6_DEPTH)


with BuildPart() as part_1:
    add(part.part)

    add(body_2.part)  # Boss-Extrude7 merges body 2
    # Sketch16 → Boss-Extrude7 (add)
    with BuildSketch(Plane(origin=(0, 105, 0), x_dir=(1, 0, 0), z_dir=(0, 1, 0))):
        with BuildLine():
            Line((-79.25000000000004, 34.74999999999998), (-79.25000000000004, -157.75000000000003))
            ThreePointArc((-79.25000000000004, -157.75000000000003), (-78.88388347648322, -158.63388347648322), (-78.00000000000001, -159.00000000000003))
            Line((-78.00000000000001, -159.00000000000003), (77.99999999999999, -159.00000000000003))
            ThreePointArc((77.99999999999999, -159.00000000000003), (78.88388347648316, -158.63388347648322), (79.24999999999999, -157.75000000000003))
            Line((79.24999999999999, -157.75000000000003), (79.24999999999991, 34.749999999999986))
            ThreePointArc((79.24999999999991, 34.749999999999986), (78.8838834764831, 35.63388347648314), (77.99999999999996, 35.99999999999997))
            Line((77.99999999999996, 35.99999999999997), (-78.00000000000004, 35.99999999999998))
            ThreePointArc((-78.00000000000004, 35.99999999999998), (-78.88388347648322, 35.63388347648316), (-79.25000000000004, 34.74999999999998))
        make_face()
    extrude(amount=BOSS_EXTRUDE7_DEPTH)

    # Sketch17 → Cut-Extrude6 (cut)
    with BuildSketch(Plane.XZ.offset(-105)):
        with Locations((-9.695908791144348, 54.3605461890202)):
            Rectangle(SKETCH17_W, SKETCH17_H)
        with BuildLine():
            Line((77.99999999999996, -32.749999999999986), (77.99999999999996, 32.750000000000014))
            ThreePointArc((77.99999999999996, 32.750000000000014), (77.41421356237305, 34.16421356237311), (75.99999999999996, 34.750000000000014))
            Line((75.99999999999996, 34.750000000000014), (-76.00000000000004, 34.750000000000014))
            ThreePointArc((-76.00000000000004, 34.750000000000014), (-77.41421356237313, 34.16421356237311), (-78.00000000000004, 32.750000000000014))
            Line((-78.00000000000004, 32.750000000000014), (-78.00000000000004, -32.749999999999986))
            ThreePointArc((-78.00000000000004, -32.749999999999986), (-77.41421356237313, -34.16421356237308), (-76.00000000000004, -34.749999999999986))
            Line((-76.00000000000004, -34.749999999999986), (75.99999999999996, -34.749999999999986))
            ThreePointArc((75.99999999999996, -34.749999999999986), (77.41421356237305, -34.16421356237308), (77.99999999999996, -32.749999999999986))
        make_face(mode=Mode.SUBTRACT)
    extrude(amount=CUT_EXTRUDE6_DEPTH, mode=Mode.SUBTRACT)


with BuildPart() as cut_extrude6_piece_1:
    # of the separate pieces the step leaves, piece 1, a body of its own (cut_extrude6_pieces)
    add(part_1.part.solids().sort_by_distance((-76, 105, -34.25))[0])

    # Fillet6
    fillet6_edges = [cut_extrude6_piece_1.edges().sort_by_distance(p)[0] for p in [
        (-78.88388347648322, 106.5, -35.633883476483156),
        (-79.25000000000004, 106.5, 61.50000000000002),
        (-78.88388347648322, 106.5, 158.63388347648322),
        (-1.421e-14, 106.5, 159.00000000000003),
        (78.88388347648318, 106.5, 158.63388347648322),
        (79.24999999999994, 106.5, 61.50000000000003),
        (78.8838834764831, 106.5, -35.63388347648314),
        (-4.263e-14, 106.5, -35.99999999999997),
    ]]
    fillet(fillet6_edges, radius=FILLET6_R)

    # Sketch21 → Cut-Extrude11 (cut)
    with BuildSketch(Plane(origin=(0, 106.5, 0), x_dir=(1, 0, 0), z_dir=(0, 1, 0))):
        with Locations(Location((-75.68068975770814, -155.43068975770817, 0), (0, 0, 270))):
            Circle(SKETCH21_R)
        with Locations(Location((75.68068975770811, -155.43068975770834, 0), (0, 0, 270))):
            Circle(SKETCH21_R)
    extrude(amount=-CUT_EXTRUDE11_DEPTH, mode=Mode.SUBTRACT)

    # Sketch22 → Cut-Extrude12 (cut)
    with BuildSketch(Plane(origin=(0, 106.5, 0), x_dir=(1, 0, 0), z_dir=(0, 1, 0))):
        with Locations(Location((-53.000000000000014, -122.75000000000003, 0), (0, 0, 270))):
            Circle(SKETCH22_R)
        with Locations(Location((53.000000000000014, -121.25000000000003, 0), (0, 0, 270))):
            Circle(SKETCH22_R_2)
        with Locations(Location((53.000000000000014, -124.25000000000003, 0), (0, 0, 270))):
            Circle(SKETCH22_R_2)
        with Locations(Location((48.000000000000014, -122.75000000000003, 0), (0, 0, 270))):
            Circle(SKETCH22_R_3)
    extrude(amount=-CUT_EXTRUDE12_DEPTH, mode=Mode.SUBTRACT)


with BuildPart() as cut_extrude6_piece_2:
    # of the separate pieces the step leaves, piece 2, a body of its own (cut_extrude6_pieces)
    add(part_1.part.solids().sort_by_distance((-78, 2, -32.75))[0])

    # Sketch18 → Cut-Extrude7 (cut)
    with BuildSketch(Plane.XZ.offset(-99.99999999999999)):
        Rectangle(SKETCH18_W, SKETCH18_H)
    extrude(amount=CUT_EXTRUDE7_DEPTH, mode=Mode.SUBTRACT)


solid = cut_extrude6_piece_1.part
